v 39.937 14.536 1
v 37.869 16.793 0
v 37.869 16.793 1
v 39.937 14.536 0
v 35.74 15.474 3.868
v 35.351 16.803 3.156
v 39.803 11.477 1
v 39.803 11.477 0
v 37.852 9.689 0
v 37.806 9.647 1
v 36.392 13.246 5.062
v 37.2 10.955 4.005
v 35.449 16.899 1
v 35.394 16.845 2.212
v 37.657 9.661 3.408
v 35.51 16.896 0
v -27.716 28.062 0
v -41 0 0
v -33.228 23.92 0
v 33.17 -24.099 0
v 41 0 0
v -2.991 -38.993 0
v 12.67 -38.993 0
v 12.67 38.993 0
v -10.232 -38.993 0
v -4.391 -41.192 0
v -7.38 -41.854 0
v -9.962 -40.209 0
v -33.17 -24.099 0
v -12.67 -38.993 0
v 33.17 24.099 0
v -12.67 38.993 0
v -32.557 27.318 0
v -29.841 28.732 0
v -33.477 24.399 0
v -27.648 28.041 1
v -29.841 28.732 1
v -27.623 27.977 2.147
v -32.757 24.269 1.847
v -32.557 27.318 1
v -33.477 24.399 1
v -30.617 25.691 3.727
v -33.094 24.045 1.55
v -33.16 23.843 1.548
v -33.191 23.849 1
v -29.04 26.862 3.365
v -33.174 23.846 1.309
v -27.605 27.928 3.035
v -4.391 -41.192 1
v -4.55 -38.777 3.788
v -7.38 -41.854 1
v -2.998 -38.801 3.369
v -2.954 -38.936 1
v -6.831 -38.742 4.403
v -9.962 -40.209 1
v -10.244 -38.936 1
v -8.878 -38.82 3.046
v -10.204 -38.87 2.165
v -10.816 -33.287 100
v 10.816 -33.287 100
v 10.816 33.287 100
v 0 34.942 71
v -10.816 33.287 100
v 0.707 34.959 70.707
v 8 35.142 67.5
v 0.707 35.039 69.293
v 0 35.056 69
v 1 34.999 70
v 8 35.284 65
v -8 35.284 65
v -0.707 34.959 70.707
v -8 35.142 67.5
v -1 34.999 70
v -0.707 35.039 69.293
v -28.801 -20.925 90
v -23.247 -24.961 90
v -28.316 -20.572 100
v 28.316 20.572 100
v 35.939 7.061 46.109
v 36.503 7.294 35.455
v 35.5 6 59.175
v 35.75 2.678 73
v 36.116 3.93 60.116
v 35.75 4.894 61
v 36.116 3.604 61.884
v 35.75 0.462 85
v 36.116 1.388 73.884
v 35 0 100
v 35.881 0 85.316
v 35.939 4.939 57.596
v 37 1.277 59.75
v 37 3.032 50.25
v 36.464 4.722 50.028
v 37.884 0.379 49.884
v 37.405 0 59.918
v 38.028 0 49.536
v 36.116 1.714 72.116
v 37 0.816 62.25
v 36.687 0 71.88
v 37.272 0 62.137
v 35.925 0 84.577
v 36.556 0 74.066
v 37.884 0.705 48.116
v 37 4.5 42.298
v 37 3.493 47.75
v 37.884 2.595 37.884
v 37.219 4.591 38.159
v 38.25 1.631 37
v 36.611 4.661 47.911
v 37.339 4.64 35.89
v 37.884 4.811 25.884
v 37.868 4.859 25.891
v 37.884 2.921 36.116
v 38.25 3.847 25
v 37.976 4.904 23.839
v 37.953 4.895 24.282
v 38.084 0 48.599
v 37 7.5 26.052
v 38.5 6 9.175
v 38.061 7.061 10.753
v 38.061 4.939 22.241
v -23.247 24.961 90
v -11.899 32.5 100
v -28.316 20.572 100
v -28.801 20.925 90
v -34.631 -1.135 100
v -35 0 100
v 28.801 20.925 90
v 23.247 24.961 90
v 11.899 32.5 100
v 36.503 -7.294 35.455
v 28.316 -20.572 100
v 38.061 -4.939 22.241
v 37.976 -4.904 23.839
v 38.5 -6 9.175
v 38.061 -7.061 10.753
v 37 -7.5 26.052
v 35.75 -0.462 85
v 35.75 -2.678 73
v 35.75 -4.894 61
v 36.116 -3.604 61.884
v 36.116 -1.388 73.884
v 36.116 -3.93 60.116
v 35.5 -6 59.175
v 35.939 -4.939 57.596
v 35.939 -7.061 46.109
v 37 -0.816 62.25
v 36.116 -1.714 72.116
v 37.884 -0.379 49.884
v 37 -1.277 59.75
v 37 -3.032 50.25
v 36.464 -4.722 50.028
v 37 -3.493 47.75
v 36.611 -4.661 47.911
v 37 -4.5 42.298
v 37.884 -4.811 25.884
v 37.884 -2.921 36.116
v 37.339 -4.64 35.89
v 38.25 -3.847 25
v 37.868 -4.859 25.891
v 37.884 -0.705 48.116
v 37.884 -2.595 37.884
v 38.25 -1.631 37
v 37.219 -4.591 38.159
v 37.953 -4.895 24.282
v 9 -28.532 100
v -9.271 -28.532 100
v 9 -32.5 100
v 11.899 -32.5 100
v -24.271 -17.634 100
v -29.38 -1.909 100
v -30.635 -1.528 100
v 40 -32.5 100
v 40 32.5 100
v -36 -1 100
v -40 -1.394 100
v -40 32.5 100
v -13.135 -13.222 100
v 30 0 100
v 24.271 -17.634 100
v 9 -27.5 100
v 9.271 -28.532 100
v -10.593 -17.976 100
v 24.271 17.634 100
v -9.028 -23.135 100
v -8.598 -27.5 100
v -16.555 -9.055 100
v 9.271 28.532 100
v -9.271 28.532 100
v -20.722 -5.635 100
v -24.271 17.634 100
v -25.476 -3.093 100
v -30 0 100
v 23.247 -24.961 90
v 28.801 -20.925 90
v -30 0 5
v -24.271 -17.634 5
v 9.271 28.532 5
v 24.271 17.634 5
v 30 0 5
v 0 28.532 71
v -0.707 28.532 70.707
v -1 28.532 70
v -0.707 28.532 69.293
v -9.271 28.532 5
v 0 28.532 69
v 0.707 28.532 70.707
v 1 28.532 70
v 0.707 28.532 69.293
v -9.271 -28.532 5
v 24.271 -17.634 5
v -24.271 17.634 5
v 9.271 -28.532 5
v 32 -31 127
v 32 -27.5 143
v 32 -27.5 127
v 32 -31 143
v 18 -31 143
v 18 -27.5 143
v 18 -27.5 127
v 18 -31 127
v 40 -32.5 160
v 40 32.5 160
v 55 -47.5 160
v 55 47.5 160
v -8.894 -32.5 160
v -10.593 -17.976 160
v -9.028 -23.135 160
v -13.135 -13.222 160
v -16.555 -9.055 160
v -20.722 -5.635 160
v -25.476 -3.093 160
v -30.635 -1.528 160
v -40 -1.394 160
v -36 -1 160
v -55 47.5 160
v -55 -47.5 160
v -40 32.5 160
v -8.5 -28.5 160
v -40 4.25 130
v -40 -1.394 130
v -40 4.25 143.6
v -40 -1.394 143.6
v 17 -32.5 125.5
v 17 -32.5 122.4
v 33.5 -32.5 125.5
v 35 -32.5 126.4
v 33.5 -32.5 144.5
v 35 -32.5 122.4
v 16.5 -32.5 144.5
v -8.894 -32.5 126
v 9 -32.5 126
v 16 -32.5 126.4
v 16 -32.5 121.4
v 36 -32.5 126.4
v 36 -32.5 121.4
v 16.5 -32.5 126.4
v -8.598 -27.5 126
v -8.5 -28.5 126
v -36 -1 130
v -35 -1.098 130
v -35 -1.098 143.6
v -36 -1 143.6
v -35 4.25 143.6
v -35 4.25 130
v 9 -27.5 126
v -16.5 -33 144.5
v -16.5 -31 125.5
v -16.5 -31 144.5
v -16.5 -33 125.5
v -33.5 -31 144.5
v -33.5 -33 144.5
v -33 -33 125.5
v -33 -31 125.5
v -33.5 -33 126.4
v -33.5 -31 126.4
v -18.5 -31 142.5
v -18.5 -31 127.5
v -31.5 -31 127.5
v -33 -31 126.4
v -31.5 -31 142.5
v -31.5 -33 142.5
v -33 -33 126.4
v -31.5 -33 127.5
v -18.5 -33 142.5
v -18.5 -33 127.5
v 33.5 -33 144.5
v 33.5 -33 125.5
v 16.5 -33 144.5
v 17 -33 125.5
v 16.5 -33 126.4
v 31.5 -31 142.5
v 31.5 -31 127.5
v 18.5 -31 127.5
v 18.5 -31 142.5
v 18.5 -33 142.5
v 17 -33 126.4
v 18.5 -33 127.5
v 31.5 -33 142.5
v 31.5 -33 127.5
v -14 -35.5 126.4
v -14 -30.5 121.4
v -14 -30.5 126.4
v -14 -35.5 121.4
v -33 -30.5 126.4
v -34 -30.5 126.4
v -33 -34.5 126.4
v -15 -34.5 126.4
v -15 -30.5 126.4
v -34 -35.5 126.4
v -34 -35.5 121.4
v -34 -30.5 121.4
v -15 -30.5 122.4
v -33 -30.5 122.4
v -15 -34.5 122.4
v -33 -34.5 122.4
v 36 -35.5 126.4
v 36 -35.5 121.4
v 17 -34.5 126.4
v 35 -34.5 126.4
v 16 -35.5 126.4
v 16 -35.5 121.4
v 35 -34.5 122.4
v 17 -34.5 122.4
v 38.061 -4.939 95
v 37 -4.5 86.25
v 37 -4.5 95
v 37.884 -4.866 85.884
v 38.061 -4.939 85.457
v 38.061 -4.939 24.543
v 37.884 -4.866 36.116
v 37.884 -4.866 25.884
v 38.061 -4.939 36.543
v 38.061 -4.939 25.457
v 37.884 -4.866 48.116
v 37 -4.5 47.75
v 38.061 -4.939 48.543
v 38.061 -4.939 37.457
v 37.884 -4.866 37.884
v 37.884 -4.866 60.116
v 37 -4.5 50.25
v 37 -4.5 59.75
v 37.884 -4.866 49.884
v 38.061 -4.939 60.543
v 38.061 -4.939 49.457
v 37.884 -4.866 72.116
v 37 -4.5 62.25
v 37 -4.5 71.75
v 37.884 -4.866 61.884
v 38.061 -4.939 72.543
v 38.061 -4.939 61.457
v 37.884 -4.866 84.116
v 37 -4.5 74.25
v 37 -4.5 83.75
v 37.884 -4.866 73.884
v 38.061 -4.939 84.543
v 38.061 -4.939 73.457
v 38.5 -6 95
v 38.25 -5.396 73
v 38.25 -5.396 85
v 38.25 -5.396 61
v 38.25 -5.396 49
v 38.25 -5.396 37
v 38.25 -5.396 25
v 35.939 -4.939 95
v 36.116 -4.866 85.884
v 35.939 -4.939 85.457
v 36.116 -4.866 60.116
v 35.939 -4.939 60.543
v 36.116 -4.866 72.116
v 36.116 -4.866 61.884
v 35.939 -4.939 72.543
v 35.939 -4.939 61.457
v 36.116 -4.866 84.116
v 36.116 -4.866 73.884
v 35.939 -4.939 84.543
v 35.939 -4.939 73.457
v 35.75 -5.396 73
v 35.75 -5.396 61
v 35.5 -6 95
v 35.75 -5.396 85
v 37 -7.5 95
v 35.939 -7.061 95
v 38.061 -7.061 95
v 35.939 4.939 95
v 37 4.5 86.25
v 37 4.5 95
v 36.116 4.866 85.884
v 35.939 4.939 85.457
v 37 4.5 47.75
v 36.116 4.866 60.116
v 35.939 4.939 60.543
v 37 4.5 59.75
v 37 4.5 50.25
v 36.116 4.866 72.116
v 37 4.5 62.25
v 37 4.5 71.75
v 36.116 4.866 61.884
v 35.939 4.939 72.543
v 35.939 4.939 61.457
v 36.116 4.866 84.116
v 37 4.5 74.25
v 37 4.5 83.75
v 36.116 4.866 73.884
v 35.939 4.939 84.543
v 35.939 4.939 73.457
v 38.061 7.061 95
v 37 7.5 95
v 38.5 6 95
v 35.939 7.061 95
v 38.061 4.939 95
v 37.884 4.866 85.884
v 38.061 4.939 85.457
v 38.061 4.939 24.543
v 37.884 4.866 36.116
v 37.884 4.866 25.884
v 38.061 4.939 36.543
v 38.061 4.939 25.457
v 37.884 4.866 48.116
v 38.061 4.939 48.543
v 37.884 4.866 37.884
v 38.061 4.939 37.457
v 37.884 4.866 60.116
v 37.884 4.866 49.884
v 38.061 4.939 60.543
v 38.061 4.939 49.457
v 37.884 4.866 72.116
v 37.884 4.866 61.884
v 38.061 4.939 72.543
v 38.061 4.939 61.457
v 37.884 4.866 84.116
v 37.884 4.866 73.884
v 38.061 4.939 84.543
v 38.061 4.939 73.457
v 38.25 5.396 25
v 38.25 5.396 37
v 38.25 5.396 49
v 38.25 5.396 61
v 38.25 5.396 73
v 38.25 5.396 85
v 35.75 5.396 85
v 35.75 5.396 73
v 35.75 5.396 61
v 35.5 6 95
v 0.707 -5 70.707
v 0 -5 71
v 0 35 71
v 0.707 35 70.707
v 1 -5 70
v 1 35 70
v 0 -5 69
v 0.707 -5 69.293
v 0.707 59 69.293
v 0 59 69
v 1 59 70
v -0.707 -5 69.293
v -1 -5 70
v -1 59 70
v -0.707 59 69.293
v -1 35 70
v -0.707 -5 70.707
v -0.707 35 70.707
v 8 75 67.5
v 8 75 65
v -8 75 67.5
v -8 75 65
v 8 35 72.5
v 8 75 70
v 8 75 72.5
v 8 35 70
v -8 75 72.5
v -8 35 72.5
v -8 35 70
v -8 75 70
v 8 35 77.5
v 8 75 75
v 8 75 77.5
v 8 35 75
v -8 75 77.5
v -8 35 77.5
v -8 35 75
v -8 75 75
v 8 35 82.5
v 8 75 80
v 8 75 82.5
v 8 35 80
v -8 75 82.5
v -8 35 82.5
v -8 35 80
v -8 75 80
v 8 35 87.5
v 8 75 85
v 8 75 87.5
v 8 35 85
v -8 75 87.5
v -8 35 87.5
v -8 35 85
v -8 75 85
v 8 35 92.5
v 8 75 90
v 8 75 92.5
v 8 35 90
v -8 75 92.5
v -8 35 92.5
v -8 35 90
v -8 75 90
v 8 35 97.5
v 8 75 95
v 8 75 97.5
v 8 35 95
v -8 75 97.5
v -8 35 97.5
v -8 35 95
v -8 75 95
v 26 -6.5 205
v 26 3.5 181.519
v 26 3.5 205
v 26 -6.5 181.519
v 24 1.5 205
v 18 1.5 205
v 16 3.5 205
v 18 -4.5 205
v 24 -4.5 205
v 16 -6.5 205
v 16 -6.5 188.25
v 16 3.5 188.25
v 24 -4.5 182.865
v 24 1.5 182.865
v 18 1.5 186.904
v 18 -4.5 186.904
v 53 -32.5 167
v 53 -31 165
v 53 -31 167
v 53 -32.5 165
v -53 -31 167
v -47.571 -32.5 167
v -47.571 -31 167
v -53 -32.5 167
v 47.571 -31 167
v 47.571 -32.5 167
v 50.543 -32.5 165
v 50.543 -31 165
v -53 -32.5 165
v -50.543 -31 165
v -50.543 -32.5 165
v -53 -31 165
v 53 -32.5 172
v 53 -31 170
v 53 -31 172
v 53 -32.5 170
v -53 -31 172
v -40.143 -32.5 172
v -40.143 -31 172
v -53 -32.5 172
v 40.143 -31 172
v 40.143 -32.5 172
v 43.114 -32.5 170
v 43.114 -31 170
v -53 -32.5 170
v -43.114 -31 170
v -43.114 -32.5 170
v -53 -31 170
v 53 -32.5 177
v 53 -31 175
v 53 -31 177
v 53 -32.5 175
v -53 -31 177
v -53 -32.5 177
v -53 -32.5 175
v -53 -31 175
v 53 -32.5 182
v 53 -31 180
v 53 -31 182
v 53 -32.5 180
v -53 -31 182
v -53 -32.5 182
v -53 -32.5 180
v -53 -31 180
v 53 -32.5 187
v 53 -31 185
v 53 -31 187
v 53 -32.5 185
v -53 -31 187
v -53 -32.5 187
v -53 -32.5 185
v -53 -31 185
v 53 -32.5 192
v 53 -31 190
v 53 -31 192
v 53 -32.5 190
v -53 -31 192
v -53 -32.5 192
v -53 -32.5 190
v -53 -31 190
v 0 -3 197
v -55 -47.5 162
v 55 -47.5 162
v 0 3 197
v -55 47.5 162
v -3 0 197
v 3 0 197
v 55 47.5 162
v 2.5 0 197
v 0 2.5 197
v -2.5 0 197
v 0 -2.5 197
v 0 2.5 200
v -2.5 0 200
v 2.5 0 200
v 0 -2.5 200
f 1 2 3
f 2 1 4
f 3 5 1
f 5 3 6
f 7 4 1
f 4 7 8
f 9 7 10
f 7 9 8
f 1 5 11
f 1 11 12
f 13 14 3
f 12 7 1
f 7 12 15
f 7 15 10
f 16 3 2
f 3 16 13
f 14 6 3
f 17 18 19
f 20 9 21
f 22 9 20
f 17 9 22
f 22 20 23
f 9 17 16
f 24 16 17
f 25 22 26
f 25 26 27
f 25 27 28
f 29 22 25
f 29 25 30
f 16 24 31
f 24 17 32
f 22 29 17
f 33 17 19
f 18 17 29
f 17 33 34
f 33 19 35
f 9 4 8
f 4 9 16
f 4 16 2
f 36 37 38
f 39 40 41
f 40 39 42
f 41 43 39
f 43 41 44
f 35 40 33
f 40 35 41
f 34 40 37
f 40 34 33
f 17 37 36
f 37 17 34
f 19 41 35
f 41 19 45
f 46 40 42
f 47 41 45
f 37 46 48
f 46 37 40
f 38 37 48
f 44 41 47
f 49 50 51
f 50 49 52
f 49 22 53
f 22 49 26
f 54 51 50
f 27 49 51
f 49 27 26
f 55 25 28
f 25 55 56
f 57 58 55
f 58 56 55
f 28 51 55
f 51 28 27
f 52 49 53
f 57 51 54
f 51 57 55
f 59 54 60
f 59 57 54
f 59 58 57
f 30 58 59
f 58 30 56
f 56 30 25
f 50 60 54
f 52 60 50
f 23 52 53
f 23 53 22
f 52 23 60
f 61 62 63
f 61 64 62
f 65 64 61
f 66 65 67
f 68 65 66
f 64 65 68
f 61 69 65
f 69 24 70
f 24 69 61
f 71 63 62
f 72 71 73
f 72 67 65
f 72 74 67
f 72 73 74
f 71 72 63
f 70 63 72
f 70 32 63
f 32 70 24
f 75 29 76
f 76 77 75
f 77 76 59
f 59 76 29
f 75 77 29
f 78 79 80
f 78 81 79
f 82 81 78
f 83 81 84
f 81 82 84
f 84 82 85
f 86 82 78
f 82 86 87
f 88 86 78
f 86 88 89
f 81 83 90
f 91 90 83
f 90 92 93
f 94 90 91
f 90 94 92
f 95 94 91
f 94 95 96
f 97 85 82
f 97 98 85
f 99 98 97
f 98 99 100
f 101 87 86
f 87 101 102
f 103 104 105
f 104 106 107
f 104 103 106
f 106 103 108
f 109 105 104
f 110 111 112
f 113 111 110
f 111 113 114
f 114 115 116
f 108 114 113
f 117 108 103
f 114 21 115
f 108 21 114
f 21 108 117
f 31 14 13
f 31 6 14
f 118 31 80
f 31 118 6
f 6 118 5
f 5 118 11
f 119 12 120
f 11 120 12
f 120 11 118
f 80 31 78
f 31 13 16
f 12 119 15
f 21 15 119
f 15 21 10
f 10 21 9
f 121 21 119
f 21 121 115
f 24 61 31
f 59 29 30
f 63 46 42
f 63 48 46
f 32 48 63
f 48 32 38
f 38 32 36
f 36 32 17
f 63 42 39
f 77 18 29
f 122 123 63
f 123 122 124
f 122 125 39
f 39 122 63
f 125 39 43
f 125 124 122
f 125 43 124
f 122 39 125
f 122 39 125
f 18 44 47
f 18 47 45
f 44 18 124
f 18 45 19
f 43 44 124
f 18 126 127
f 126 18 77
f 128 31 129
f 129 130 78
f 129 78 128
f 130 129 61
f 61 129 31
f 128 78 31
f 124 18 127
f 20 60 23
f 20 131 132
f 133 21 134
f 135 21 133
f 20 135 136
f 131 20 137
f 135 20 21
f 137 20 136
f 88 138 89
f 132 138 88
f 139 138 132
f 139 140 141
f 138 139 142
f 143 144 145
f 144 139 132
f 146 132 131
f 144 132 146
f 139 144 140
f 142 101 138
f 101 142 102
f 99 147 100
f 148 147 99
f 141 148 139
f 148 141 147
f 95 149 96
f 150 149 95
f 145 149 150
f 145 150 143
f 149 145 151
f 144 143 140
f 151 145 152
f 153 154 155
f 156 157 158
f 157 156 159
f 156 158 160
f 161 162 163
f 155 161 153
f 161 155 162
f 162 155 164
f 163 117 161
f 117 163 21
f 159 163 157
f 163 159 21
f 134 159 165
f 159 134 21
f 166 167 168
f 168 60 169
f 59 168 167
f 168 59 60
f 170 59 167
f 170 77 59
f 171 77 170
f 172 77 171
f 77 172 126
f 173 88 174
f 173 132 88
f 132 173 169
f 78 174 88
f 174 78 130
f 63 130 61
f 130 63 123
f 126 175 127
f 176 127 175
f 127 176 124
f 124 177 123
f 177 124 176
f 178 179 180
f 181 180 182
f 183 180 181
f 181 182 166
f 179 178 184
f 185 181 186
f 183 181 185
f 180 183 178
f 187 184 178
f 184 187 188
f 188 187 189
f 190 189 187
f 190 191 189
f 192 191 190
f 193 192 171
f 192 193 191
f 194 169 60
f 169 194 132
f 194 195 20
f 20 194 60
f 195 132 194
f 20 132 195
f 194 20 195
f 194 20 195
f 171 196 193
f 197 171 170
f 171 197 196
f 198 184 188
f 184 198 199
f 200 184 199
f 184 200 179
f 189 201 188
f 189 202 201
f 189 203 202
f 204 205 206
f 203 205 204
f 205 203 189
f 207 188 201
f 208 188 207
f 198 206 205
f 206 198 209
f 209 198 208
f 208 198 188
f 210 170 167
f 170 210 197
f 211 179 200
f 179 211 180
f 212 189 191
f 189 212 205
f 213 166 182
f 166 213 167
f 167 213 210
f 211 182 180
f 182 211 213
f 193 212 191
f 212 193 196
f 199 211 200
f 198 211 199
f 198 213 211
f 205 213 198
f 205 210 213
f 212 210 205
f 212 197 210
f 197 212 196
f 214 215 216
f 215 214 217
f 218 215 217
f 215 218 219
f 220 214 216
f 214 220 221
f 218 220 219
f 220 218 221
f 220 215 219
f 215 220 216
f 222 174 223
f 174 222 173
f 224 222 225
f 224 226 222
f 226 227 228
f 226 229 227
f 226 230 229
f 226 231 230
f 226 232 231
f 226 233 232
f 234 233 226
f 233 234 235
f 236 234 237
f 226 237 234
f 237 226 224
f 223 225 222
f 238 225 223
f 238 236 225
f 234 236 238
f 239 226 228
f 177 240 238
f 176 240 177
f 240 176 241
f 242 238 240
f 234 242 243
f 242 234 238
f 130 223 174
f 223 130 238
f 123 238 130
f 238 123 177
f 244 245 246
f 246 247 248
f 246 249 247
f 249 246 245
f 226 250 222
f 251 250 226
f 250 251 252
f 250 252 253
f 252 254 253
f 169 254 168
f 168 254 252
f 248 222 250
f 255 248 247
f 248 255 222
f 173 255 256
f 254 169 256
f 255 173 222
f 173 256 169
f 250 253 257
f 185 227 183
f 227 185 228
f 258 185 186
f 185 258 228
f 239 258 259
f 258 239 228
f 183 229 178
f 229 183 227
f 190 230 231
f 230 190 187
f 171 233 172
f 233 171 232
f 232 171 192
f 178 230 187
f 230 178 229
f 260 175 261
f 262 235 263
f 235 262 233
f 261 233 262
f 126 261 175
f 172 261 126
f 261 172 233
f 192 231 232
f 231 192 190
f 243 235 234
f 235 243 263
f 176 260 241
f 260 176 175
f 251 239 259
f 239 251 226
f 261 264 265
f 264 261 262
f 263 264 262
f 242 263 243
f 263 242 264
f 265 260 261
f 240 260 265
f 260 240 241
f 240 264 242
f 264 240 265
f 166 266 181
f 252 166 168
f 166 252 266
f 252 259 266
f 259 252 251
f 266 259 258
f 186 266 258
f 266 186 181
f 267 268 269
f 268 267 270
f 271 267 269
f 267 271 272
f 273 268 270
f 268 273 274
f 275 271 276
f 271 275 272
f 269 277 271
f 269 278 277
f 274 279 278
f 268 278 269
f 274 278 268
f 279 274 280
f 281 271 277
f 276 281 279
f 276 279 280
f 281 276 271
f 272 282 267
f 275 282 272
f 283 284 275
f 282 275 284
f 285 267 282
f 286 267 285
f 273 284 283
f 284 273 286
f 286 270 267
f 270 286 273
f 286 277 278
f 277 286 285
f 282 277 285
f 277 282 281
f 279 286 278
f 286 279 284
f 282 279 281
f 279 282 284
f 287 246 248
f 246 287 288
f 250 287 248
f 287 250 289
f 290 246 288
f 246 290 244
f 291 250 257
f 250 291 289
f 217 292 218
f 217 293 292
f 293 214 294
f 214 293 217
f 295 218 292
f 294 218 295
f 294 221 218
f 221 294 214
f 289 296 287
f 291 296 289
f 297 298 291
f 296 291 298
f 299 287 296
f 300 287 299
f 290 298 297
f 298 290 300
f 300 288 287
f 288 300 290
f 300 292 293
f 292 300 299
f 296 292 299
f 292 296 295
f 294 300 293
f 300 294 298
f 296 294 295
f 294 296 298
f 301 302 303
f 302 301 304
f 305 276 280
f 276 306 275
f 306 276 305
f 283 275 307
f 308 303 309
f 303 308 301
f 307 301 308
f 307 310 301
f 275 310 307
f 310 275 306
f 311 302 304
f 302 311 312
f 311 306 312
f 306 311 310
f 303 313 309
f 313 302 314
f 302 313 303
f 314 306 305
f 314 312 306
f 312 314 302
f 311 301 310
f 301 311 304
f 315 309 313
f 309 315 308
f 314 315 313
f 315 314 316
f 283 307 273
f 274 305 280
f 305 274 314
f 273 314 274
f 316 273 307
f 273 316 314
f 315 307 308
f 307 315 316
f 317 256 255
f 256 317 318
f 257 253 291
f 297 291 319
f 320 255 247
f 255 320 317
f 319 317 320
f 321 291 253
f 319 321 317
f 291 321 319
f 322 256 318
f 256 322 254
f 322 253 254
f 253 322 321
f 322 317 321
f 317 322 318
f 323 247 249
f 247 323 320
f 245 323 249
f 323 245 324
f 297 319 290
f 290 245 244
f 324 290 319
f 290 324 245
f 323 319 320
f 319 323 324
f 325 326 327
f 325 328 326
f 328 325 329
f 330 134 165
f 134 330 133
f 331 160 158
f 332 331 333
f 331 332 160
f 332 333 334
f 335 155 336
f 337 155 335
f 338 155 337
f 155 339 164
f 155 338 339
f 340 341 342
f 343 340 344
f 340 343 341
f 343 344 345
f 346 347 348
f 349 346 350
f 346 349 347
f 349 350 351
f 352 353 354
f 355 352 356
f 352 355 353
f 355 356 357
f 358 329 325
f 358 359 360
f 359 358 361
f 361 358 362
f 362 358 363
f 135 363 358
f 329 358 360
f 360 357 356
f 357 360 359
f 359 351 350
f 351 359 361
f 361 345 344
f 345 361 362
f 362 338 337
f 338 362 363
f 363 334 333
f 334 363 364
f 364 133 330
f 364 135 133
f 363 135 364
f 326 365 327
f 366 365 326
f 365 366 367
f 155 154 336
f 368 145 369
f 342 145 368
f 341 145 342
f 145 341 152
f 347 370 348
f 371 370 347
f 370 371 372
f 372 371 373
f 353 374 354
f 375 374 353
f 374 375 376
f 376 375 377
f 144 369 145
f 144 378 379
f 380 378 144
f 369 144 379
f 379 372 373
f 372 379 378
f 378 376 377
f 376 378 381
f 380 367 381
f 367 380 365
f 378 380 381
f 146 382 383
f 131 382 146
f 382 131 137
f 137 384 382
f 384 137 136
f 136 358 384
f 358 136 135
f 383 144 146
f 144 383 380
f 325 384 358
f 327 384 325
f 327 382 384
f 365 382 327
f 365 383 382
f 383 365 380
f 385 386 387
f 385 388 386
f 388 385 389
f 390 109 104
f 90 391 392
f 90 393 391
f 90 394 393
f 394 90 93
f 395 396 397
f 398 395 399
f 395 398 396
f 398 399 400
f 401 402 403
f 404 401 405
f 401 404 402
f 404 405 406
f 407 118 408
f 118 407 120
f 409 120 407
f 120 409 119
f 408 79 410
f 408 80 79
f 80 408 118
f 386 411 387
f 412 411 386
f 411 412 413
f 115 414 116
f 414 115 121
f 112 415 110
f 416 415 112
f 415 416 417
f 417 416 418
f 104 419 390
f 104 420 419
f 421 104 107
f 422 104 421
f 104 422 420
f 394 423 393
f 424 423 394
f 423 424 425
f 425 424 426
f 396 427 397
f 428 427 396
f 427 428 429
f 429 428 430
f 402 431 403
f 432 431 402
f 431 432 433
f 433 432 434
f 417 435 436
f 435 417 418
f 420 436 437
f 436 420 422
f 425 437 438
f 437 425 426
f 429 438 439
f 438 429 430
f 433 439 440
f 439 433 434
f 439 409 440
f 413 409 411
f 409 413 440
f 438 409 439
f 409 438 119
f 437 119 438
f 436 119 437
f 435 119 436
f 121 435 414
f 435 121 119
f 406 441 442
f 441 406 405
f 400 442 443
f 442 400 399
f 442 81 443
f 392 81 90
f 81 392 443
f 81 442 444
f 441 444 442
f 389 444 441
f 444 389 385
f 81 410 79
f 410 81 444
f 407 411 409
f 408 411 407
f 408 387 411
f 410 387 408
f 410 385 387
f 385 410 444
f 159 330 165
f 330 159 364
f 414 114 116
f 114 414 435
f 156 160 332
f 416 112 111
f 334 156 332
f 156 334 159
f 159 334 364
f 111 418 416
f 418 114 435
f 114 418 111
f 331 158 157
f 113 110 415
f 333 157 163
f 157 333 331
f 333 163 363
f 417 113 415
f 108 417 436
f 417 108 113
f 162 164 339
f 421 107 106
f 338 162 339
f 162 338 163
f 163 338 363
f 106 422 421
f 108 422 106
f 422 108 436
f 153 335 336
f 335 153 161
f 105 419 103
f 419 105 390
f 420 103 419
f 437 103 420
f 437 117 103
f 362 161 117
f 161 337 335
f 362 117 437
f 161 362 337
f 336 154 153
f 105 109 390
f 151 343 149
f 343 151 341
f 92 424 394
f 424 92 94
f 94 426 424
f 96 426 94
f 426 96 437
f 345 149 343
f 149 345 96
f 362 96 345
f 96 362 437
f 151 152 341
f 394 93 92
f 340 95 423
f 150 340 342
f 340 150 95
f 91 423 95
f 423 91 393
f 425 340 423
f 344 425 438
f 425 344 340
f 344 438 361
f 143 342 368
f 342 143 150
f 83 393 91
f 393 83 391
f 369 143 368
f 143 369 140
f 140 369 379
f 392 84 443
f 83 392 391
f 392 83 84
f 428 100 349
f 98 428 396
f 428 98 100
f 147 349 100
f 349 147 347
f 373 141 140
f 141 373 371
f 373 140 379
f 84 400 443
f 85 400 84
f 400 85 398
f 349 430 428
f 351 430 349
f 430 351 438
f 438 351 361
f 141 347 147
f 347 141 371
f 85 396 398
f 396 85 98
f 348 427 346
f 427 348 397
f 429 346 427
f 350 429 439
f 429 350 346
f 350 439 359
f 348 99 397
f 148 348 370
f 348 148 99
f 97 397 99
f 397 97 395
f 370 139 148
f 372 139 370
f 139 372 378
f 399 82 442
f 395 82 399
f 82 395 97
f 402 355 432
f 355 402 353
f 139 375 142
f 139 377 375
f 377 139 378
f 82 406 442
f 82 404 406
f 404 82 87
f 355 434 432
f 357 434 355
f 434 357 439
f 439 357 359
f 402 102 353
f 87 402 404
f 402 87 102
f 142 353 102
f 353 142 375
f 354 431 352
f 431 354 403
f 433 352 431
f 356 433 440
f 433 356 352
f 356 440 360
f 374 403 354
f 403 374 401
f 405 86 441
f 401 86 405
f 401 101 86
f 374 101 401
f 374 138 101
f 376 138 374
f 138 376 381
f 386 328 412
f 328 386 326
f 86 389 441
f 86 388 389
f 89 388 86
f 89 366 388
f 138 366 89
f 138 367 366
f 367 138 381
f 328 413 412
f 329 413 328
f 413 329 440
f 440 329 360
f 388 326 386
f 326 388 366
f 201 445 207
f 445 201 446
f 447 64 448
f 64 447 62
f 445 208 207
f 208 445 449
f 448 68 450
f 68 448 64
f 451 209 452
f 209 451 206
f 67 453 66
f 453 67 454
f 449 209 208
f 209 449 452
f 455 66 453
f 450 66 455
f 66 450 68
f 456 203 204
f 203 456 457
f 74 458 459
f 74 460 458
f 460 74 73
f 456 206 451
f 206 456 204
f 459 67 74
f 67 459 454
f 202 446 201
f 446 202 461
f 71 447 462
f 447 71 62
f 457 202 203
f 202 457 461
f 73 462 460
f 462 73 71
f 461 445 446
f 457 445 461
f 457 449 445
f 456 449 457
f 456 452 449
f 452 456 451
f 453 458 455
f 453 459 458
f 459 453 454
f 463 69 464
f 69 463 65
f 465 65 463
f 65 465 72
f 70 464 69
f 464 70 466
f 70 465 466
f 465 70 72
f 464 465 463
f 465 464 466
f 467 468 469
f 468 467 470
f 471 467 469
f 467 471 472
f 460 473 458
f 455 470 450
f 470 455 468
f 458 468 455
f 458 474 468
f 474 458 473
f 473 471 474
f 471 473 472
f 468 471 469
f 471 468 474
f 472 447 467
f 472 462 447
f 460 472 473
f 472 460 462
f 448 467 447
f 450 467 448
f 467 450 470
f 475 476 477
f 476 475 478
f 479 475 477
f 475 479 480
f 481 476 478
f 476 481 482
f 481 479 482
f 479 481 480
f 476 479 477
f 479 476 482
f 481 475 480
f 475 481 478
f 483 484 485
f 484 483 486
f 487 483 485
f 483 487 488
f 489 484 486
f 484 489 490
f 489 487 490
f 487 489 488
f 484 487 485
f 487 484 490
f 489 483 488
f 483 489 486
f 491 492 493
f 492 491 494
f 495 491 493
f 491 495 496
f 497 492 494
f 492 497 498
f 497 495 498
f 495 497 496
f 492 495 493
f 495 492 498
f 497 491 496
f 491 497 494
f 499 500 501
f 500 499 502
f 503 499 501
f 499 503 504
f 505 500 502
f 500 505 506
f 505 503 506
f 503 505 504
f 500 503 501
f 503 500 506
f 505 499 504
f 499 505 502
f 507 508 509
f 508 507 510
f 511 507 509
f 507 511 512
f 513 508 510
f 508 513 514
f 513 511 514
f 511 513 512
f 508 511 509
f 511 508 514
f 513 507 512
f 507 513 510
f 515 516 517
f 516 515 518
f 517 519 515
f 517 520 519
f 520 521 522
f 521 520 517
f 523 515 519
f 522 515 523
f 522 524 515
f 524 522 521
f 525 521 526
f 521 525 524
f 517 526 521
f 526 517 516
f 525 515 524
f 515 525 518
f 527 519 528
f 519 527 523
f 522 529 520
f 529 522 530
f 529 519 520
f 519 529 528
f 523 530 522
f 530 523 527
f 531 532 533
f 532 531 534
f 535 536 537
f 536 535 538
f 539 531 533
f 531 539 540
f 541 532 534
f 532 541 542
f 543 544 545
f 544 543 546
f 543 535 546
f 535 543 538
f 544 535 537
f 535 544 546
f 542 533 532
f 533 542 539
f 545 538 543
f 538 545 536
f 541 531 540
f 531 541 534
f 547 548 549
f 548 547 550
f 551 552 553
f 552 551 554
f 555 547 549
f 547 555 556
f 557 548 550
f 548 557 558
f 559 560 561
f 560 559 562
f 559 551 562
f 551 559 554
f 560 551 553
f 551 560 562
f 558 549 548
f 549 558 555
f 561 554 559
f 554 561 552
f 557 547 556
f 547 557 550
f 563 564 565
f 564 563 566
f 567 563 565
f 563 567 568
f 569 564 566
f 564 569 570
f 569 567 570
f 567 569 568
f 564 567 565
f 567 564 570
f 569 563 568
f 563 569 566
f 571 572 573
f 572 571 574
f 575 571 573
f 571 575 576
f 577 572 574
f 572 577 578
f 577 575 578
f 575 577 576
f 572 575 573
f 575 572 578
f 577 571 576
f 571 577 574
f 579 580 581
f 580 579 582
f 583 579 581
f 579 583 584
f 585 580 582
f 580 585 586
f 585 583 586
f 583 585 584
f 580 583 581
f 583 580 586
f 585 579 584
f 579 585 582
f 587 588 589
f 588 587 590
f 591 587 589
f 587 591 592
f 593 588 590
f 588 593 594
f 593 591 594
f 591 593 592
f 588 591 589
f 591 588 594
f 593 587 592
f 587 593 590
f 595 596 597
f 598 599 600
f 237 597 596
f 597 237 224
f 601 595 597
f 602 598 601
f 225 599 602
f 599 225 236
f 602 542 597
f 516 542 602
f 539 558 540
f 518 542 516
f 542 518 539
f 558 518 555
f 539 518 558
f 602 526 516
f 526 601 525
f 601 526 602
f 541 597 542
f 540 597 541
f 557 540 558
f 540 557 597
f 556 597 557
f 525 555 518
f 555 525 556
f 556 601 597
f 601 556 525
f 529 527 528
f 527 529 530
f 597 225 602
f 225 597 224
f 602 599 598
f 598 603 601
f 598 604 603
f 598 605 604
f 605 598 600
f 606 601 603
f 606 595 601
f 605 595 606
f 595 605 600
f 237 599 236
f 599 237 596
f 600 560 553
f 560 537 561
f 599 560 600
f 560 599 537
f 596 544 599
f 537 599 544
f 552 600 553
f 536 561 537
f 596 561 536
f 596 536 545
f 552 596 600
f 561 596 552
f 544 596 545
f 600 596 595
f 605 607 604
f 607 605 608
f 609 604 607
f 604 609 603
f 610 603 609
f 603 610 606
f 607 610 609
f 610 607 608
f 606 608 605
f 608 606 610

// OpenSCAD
// Treehouse Planter — Whimsical Birdhouse-Style Succulent Pot
// Tree trunk base with hollow planting cavity, rope bridge, ladder
// DUAL COLOR: trunk (bark brown) | roof + windows + door (bright color)
// PLA — 0.15mm, 4 walls, 20% infill
// PETG for outdoor use; ~200mm tall

TRUNK_D   = 70;
TRUNK_H   = 100;
CABIN_W   = 80;
CABIN_D   = 65;
CABIN_H   = 60;
ROOF_OVER = 15;   // Roof overhang
WALL_T    = 4.0;
WIN_W     = 14;
WIN_H     = 16;
DOOR_W    = 18;
DOOR_H    = 26;
PLANTER_D = 55;   // Inner planting cavity diameter
DRAIN_D   = 5.0;
LADDER_W  = 12;
RUNG_N    = 7;

// ── Tree trunk base ───────────────────────────────────
module trunk() {
    difference() {
        union() {
            // Main trunk (organic tapered cylinder)
            cylinder(d1=TRUNK_D+12, d2=TRUNK_D, h=TRUNK_H, $fn=10);
            // Root buttresses (3 flared roots)
            for (i=[0:2])
                rotate([0,0,i*120+20])
                    hull() {
                        translate([TRUNK_D*0.4, 0, 0])
                            cylinder(d=16, h=8, $fn=8);
                        translate([TRUNK_D*0.55, 0, 0])
                            cylinder(d=8, h=1, $fn=8);
                        translate([0, 0, 25])
                            cylinder(d=6, h=4, $fn=6);
                    }
            // Bark texture (horizontal ridges)
            for (z=[10:8:TRUNK_H-10])
                translate([0, 0, z])
                    rotate_extrude($fn=10)
                        translate([TRUNK_D/2, 0, 0])
                            scale([0.4, 1])
                                circle(d=3, $fn=8);
        }
        // Hollow (for drainage + weight reduction)
        translate([0, 0, 5])
            cylinder(d=TRUNK_D-WALL_T*2.5, h=TRUNK_H, $fn=10);
    }
}

// ── Cabin body ────────────────────────────────────────
module cabin() {
    translate([-CABIN_W/2, -CABIN_D/2, TRUNK_H]) {
        difference() {
            cube([CABIN_W, CABIN_D, CABIN_H]);
            // Hollow interior (planting cavity)
            translate([WALL_T, WALL_T, -1])
                cylinder(d=PLANTER_D, h=CABIN_H+2, $fn=32);
            // Front windows (2)
            for (x=[8, CABIN_W-WIN_W-8])
                translate([x, -1, CABIN_H*0.45])
                    cube([WIN_W, WALL_T+2, WIN_H]);
            // Side window
            translate([-1, CABIN_D*0.35, CABIN_H*0.5])
                cube([WALL_T+2, WIN_W, WIN_H*0.85]);
            // Door (front)
            translate([CABIN_W/2-DOOR_W/2, -1, 0])
                cube([DOOR_W, WALL_T+2, DOOR_H]);
            // Drainage hole (bottom)
            cylinder(d=DRAIN_D, h=5, $fn=12);
        }
        // Window frames (raised, Color 2)
        for (x=[8, CABIN_W-WIN_W-8])
            translate([x-1.5, -0.5, CABIN_H*0.45-1.5])
                difference() {
                    cube([WIN_W+3, 2, WIN_H+3]);
                    translate([2, -1, 2]) cube([WIN_W-1, 4, WIN_H-1]);
                }
        // Flower boxes under windows
        for (x=[6, CABIN_W-WIN_W-10])
            translate([x, -3, CABIN_H*0.44-5])
                difference() {
                    cube([WIN_W+6, 5, 5]);
                    translate([1, 1, 1]) cube([WIN_W+4, 4, 5]);
                }
    }
}

// ── Roof (Color 2) ────────────────────────────────────
module roof() {
    translate([0, 0, TRUNK_H+CABIN_H]) {
        // Gabled roof
        hull() {
            translate([-CABIN_W/2-ROOF_OVER, -CABIN_D/2-ROOF_OVER, 0])
                cube([CABIN_W+ROOF_OVER*2, CABIN_D+ROOF_OVER*2, 2]);
            translate([0, 0, 35]) cylinder(d=6, h=2, $fn=4);
        }
        // Roof ridgeline
        cylinder(d=5, h=40, $fn=4);
        // Chimney
        translate([CABIN_W*0.2, -CABIN_D*0.1, 20])
            difference() {
                cube([10, 10, 25]);
                translate([2,2,-1]) cube([6,6,26]);
            }
        // Shingle detail lines
        for (z=[5:5:32])
            translate([-CABIN_W/2-ROOF_OVER+2, -CABIN_D/2, z])
                cube([CABIN_W+ROOF_OVER*2-4, 1.5, 2]);
    }
}

// ── Ladder (side — Color 1 wood) ──────────────────────
module ladder() {
    translate([TRUNK_D/2+2, 0, 5]) {
        // Side rails
        for (sy=[-1,1])
            translate([0, sy*LADDER_W/2, 0])
                cylinder(d=3, h=TRUNK_H-10, $fn=8);
        // Rungs
        for (i=[0:RUNG_N-1])
            translate([0, -LADDER_W/2, 8+i*(TRUNK_H-16)/RUNG_N])
                rotate([-90,0,0])
                    cylinder(d=2.5, h=LADDER_W, $fn=8);
    }
}

// ── Rope bridge connector (decorative) ────────────────
module rope_bridge() {
    translate([0, TRUNK_D/2, TRUNK_H*0.7]) {
        for (rope=[0:3])
            translate([0, rope*8, 0])
                rotate([90,0,0])
                    cylinder(d=2, h=40, $fn=8);
        // Bridge planks
        for (z=[-5:5:TRUNK_H*0.3-5])
            translate([-8, 0, z])
                cube([16, 40, 2.5]);
    }
}

// Color 1 (bark brown): trunk + ladder + bridge
trunk();
cabin();
ladder();
rope_bridge();
// Color 2 (bright): roof + window frames
roof();
